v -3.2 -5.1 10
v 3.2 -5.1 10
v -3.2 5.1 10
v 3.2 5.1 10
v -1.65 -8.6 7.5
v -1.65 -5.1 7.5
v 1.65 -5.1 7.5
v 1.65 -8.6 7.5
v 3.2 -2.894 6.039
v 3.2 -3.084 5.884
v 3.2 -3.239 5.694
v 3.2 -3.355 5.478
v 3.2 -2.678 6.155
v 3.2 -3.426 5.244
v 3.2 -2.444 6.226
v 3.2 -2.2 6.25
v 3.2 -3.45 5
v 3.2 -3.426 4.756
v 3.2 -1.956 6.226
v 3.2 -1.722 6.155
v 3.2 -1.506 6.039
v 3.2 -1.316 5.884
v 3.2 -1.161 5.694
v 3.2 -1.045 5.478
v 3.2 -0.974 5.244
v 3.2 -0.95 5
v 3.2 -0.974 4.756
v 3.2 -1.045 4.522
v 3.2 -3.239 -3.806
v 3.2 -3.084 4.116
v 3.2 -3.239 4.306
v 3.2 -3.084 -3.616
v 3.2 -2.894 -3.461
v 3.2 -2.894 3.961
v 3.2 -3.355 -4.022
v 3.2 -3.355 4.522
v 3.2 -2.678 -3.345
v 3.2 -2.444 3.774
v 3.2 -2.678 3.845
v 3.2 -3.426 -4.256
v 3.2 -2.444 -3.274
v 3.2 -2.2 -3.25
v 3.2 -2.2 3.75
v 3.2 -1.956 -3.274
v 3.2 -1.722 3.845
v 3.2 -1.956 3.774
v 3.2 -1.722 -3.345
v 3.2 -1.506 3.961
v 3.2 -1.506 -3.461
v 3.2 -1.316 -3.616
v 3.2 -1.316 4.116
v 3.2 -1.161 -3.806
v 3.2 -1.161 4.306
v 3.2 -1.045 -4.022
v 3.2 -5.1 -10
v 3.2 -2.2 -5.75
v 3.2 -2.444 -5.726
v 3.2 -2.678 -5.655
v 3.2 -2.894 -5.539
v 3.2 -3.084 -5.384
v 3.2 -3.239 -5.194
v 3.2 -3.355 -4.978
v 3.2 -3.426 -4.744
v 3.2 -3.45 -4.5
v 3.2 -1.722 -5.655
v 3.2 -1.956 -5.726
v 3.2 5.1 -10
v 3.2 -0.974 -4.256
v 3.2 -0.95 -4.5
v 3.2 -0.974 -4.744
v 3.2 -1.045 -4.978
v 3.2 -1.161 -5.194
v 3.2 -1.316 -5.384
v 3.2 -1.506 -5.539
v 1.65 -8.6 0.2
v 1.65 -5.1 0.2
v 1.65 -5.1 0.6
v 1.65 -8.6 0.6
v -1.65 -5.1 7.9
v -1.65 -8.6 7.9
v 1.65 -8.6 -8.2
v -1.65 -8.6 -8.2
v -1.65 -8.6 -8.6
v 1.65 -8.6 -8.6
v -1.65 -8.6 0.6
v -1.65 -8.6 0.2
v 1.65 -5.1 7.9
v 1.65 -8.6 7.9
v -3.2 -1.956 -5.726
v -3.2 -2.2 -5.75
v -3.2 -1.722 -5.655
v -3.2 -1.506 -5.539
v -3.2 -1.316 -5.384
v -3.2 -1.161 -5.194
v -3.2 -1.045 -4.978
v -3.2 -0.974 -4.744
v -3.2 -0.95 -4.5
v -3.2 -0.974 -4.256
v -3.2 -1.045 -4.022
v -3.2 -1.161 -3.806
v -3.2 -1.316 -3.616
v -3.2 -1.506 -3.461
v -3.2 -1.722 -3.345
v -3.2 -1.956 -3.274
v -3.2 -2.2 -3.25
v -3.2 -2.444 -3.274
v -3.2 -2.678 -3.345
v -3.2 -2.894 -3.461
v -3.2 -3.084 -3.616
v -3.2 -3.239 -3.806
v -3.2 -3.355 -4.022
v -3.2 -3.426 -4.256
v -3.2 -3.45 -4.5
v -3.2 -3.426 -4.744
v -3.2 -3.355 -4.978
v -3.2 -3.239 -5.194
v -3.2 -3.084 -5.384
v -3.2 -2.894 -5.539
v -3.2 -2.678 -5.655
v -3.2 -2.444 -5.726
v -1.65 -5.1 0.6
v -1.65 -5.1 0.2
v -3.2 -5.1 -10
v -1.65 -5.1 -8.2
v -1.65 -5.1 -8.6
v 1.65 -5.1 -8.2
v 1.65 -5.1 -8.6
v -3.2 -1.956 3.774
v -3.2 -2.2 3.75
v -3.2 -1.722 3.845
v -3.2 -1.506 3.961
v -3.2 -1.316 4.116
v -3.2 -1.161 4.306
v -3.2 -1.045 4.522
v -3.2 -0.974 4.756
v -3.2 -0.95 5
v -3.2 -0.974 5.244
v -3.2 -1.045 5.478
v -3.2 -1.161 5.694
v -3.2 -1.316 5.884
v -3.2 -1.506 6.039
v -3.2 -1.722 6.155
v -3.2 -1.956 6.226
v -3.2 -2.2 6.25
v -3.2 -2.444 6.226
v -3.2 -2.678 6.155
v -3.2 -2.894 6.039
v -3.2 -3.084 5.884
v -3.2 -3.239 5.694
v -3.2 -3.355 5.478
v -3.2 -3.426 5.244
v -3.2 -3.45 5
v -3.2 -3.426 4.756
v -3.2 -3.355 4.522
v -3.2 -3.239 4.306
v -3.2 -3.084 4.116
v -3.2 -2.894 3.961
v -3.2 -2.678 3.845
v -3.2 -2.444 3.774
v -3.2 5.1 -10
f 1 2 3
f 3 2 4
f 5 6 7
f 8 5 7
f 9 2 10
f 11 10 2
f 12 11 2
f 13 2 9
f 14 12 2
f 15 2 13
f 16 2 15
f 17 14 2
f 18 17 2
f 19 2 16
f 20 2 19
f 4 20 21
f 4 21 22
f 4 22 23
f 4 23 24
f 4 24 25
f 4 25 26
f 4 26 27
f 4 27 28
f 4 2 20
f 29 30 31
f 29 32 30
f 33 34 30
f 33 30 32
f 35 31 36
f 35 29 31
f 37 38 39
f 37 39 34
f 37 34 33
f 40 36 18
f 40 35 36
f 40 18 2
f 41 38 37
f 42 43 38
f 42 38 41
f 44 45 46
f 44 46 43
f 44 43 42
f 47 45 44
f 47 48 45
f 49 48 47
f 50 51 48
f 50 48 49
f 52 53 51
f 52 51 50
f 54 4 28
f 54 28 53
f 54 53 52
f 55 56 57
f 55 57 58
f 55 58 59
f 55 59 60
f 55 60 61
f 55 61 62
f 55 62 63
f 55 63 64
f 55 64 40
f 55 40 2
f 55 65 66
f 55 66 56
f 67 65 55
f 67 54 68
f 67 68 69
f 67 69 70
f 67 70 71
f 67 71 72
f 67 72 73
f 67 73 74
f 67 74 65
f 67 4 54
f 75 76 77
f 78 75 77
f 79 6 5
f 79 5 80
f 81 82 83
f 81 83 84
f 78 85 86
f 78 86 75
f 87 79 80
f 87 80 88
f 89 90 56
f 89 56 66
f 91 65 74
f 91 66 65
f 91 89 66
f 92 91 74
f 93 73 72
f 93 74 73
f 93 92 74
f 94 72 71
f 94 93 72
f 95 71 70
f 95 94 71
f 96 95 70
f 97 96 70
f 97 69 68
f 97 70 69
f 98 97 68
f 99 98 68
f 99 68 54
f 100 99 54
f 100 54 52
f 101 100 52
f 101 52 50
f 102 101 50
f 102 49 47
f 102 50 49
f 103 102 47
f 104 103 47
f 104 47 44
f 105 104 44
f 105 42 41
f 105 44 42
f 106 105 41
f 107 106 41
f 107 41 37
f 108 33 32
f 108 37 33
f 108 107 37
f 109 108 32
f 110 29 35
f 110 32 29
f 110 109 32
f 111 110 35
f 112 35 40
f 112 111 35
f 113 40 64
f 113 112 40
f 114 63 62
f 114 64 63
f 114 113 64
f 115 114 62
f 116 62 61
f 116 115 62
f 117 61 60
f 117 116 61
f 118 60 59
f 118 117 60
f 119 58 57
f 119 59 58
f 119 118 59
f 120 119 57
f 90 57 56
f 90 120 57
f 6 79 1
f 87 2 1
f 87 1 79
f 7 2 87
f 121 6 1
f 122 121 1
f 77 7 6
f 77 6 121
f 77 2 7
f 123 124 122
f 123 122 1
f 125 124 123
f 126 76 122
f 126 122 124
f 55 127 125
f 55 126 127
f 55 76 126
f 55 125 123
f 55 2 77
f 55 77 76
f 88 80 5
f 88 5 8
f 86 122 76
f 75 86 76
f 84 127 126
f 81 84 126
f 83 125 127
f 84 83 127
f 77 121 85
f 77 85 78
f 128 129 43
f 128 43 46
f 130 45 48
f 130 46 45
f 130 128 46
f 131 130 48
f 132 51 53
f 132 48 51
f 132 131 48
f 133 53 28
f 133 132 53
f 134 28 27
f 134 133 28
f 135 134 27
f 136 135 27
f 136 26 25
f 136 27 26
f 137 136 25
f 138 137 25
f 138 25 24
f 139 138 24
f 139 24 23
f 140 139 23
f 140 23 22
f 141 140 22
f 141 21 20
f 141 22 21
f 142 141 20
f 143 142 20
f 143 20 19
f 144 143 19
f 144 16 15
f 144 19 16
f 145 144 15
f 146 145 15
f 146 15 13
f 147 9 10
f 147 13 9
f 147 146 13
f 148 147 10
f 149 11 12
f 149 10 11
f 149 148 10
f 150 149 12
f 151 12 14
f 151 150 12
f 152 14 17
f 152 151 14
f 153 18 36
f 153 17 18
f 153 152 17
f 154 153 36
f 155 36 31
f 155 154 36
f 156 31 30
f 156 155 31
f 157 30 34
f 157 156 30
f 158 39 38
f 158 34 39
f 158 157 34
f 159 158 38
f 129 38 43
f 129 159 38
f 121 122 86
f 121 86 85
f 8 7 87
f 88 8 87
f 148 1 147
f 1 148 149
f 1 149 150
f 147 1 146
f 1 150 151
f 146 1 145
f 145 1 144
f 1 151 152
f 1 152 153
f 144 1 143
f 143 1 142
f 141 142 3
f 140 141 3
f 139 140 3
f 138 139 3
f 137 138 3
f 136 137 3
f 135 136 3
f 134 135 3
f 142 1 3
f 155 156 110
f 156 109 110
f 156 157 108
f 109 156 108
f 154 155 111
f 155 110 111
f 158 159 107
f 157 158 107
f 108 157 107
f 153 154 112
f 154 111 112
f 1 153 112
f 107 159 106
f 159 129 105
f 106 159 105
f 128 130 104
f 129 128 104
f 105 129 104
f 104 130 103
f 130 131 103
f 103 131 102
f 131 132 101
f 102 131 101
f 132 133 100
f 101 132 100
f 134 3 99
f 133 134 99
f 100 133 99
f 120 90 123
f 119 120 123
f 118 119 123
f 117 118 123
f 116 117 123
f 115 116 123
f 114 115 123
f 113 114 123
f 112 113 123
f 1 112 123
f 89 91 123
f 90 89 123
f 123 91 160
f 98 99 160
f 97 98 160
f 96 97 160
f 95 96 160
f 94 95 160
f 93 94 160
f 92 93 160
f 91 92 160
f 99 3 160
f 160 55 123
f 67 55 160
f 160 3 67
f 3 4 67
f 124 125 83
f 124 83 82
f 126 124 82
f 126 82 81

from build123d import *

# Parameters (mm, degrees)
SKETCH1_W               = 20
SKETCH1_H               = 10.2
BOSS_EXTRUDE1_DEPTH     = 3.2
CUT_EXTRUDE1_DEPTH      = 12.67261753
CUT_EXTRUDE1_DEPTH_BACK = 12.67261753
SKETCH2_R               = 1.25
SKETCH3_W               = 3.3
SKETCH3_H               = 0.4
BOSS_EXTRUDE2_DEPTH     = 3.5


with BuildPart() as part:
    # Sketch1 → Boss-Extrude1 (new, symmetric)
    with BuildSketch(Plane(origin=(0, 0, 0), x_dir=(0, 0, -1), z_dir=(1, 0, 0))):
        Rectangle(SKETCH1_W, SKETCH1_H)
    extrude(amount=BOSS_EXTRUDE1_DEPTH, both=True)

    # Sketch2 → Cut-Extrude1 (cut, two sides: drawn at the far end of the back side and taken through both)
    with BuildSketch(Plane(origin=(0, 0, 0), x_dir=(0, 0, -1), z_dir=(1, 0, 0)).offset(-CUT_EXTRUDE1_DEPTH_BACK)):
        with Locations((-5, -2.2)):
            Circle(SKETCH2_R)
        with Locations((4.5, -2.2)):
            Circle(SKETCH2_R)
    extrude(amount=CUT_EXTRUDE1_DEPTH + CUT_EXTRUDE1_DEPTH_BACK, mode=Mode.SUBTRACT)

    # Sketch3 → Boss-Extrude2 (add)
    with BuildSketch(Plane.XZ.offset(5.1)):
        with Locations((0, -8.4)):
            Rectangle(SKETCH3_W, SKETCH3_H)
        with Locations((0, 0.4)):
            Rectangle(SKETCH3_W, SKETCH3_H)
        with Locations((0, 7.7)):
            Rectangle(SKETCH3_W, SKETCH3_H)
    extrude(amount=BOSS_EXTRUDE2_DEPTH)


solid = part.part
